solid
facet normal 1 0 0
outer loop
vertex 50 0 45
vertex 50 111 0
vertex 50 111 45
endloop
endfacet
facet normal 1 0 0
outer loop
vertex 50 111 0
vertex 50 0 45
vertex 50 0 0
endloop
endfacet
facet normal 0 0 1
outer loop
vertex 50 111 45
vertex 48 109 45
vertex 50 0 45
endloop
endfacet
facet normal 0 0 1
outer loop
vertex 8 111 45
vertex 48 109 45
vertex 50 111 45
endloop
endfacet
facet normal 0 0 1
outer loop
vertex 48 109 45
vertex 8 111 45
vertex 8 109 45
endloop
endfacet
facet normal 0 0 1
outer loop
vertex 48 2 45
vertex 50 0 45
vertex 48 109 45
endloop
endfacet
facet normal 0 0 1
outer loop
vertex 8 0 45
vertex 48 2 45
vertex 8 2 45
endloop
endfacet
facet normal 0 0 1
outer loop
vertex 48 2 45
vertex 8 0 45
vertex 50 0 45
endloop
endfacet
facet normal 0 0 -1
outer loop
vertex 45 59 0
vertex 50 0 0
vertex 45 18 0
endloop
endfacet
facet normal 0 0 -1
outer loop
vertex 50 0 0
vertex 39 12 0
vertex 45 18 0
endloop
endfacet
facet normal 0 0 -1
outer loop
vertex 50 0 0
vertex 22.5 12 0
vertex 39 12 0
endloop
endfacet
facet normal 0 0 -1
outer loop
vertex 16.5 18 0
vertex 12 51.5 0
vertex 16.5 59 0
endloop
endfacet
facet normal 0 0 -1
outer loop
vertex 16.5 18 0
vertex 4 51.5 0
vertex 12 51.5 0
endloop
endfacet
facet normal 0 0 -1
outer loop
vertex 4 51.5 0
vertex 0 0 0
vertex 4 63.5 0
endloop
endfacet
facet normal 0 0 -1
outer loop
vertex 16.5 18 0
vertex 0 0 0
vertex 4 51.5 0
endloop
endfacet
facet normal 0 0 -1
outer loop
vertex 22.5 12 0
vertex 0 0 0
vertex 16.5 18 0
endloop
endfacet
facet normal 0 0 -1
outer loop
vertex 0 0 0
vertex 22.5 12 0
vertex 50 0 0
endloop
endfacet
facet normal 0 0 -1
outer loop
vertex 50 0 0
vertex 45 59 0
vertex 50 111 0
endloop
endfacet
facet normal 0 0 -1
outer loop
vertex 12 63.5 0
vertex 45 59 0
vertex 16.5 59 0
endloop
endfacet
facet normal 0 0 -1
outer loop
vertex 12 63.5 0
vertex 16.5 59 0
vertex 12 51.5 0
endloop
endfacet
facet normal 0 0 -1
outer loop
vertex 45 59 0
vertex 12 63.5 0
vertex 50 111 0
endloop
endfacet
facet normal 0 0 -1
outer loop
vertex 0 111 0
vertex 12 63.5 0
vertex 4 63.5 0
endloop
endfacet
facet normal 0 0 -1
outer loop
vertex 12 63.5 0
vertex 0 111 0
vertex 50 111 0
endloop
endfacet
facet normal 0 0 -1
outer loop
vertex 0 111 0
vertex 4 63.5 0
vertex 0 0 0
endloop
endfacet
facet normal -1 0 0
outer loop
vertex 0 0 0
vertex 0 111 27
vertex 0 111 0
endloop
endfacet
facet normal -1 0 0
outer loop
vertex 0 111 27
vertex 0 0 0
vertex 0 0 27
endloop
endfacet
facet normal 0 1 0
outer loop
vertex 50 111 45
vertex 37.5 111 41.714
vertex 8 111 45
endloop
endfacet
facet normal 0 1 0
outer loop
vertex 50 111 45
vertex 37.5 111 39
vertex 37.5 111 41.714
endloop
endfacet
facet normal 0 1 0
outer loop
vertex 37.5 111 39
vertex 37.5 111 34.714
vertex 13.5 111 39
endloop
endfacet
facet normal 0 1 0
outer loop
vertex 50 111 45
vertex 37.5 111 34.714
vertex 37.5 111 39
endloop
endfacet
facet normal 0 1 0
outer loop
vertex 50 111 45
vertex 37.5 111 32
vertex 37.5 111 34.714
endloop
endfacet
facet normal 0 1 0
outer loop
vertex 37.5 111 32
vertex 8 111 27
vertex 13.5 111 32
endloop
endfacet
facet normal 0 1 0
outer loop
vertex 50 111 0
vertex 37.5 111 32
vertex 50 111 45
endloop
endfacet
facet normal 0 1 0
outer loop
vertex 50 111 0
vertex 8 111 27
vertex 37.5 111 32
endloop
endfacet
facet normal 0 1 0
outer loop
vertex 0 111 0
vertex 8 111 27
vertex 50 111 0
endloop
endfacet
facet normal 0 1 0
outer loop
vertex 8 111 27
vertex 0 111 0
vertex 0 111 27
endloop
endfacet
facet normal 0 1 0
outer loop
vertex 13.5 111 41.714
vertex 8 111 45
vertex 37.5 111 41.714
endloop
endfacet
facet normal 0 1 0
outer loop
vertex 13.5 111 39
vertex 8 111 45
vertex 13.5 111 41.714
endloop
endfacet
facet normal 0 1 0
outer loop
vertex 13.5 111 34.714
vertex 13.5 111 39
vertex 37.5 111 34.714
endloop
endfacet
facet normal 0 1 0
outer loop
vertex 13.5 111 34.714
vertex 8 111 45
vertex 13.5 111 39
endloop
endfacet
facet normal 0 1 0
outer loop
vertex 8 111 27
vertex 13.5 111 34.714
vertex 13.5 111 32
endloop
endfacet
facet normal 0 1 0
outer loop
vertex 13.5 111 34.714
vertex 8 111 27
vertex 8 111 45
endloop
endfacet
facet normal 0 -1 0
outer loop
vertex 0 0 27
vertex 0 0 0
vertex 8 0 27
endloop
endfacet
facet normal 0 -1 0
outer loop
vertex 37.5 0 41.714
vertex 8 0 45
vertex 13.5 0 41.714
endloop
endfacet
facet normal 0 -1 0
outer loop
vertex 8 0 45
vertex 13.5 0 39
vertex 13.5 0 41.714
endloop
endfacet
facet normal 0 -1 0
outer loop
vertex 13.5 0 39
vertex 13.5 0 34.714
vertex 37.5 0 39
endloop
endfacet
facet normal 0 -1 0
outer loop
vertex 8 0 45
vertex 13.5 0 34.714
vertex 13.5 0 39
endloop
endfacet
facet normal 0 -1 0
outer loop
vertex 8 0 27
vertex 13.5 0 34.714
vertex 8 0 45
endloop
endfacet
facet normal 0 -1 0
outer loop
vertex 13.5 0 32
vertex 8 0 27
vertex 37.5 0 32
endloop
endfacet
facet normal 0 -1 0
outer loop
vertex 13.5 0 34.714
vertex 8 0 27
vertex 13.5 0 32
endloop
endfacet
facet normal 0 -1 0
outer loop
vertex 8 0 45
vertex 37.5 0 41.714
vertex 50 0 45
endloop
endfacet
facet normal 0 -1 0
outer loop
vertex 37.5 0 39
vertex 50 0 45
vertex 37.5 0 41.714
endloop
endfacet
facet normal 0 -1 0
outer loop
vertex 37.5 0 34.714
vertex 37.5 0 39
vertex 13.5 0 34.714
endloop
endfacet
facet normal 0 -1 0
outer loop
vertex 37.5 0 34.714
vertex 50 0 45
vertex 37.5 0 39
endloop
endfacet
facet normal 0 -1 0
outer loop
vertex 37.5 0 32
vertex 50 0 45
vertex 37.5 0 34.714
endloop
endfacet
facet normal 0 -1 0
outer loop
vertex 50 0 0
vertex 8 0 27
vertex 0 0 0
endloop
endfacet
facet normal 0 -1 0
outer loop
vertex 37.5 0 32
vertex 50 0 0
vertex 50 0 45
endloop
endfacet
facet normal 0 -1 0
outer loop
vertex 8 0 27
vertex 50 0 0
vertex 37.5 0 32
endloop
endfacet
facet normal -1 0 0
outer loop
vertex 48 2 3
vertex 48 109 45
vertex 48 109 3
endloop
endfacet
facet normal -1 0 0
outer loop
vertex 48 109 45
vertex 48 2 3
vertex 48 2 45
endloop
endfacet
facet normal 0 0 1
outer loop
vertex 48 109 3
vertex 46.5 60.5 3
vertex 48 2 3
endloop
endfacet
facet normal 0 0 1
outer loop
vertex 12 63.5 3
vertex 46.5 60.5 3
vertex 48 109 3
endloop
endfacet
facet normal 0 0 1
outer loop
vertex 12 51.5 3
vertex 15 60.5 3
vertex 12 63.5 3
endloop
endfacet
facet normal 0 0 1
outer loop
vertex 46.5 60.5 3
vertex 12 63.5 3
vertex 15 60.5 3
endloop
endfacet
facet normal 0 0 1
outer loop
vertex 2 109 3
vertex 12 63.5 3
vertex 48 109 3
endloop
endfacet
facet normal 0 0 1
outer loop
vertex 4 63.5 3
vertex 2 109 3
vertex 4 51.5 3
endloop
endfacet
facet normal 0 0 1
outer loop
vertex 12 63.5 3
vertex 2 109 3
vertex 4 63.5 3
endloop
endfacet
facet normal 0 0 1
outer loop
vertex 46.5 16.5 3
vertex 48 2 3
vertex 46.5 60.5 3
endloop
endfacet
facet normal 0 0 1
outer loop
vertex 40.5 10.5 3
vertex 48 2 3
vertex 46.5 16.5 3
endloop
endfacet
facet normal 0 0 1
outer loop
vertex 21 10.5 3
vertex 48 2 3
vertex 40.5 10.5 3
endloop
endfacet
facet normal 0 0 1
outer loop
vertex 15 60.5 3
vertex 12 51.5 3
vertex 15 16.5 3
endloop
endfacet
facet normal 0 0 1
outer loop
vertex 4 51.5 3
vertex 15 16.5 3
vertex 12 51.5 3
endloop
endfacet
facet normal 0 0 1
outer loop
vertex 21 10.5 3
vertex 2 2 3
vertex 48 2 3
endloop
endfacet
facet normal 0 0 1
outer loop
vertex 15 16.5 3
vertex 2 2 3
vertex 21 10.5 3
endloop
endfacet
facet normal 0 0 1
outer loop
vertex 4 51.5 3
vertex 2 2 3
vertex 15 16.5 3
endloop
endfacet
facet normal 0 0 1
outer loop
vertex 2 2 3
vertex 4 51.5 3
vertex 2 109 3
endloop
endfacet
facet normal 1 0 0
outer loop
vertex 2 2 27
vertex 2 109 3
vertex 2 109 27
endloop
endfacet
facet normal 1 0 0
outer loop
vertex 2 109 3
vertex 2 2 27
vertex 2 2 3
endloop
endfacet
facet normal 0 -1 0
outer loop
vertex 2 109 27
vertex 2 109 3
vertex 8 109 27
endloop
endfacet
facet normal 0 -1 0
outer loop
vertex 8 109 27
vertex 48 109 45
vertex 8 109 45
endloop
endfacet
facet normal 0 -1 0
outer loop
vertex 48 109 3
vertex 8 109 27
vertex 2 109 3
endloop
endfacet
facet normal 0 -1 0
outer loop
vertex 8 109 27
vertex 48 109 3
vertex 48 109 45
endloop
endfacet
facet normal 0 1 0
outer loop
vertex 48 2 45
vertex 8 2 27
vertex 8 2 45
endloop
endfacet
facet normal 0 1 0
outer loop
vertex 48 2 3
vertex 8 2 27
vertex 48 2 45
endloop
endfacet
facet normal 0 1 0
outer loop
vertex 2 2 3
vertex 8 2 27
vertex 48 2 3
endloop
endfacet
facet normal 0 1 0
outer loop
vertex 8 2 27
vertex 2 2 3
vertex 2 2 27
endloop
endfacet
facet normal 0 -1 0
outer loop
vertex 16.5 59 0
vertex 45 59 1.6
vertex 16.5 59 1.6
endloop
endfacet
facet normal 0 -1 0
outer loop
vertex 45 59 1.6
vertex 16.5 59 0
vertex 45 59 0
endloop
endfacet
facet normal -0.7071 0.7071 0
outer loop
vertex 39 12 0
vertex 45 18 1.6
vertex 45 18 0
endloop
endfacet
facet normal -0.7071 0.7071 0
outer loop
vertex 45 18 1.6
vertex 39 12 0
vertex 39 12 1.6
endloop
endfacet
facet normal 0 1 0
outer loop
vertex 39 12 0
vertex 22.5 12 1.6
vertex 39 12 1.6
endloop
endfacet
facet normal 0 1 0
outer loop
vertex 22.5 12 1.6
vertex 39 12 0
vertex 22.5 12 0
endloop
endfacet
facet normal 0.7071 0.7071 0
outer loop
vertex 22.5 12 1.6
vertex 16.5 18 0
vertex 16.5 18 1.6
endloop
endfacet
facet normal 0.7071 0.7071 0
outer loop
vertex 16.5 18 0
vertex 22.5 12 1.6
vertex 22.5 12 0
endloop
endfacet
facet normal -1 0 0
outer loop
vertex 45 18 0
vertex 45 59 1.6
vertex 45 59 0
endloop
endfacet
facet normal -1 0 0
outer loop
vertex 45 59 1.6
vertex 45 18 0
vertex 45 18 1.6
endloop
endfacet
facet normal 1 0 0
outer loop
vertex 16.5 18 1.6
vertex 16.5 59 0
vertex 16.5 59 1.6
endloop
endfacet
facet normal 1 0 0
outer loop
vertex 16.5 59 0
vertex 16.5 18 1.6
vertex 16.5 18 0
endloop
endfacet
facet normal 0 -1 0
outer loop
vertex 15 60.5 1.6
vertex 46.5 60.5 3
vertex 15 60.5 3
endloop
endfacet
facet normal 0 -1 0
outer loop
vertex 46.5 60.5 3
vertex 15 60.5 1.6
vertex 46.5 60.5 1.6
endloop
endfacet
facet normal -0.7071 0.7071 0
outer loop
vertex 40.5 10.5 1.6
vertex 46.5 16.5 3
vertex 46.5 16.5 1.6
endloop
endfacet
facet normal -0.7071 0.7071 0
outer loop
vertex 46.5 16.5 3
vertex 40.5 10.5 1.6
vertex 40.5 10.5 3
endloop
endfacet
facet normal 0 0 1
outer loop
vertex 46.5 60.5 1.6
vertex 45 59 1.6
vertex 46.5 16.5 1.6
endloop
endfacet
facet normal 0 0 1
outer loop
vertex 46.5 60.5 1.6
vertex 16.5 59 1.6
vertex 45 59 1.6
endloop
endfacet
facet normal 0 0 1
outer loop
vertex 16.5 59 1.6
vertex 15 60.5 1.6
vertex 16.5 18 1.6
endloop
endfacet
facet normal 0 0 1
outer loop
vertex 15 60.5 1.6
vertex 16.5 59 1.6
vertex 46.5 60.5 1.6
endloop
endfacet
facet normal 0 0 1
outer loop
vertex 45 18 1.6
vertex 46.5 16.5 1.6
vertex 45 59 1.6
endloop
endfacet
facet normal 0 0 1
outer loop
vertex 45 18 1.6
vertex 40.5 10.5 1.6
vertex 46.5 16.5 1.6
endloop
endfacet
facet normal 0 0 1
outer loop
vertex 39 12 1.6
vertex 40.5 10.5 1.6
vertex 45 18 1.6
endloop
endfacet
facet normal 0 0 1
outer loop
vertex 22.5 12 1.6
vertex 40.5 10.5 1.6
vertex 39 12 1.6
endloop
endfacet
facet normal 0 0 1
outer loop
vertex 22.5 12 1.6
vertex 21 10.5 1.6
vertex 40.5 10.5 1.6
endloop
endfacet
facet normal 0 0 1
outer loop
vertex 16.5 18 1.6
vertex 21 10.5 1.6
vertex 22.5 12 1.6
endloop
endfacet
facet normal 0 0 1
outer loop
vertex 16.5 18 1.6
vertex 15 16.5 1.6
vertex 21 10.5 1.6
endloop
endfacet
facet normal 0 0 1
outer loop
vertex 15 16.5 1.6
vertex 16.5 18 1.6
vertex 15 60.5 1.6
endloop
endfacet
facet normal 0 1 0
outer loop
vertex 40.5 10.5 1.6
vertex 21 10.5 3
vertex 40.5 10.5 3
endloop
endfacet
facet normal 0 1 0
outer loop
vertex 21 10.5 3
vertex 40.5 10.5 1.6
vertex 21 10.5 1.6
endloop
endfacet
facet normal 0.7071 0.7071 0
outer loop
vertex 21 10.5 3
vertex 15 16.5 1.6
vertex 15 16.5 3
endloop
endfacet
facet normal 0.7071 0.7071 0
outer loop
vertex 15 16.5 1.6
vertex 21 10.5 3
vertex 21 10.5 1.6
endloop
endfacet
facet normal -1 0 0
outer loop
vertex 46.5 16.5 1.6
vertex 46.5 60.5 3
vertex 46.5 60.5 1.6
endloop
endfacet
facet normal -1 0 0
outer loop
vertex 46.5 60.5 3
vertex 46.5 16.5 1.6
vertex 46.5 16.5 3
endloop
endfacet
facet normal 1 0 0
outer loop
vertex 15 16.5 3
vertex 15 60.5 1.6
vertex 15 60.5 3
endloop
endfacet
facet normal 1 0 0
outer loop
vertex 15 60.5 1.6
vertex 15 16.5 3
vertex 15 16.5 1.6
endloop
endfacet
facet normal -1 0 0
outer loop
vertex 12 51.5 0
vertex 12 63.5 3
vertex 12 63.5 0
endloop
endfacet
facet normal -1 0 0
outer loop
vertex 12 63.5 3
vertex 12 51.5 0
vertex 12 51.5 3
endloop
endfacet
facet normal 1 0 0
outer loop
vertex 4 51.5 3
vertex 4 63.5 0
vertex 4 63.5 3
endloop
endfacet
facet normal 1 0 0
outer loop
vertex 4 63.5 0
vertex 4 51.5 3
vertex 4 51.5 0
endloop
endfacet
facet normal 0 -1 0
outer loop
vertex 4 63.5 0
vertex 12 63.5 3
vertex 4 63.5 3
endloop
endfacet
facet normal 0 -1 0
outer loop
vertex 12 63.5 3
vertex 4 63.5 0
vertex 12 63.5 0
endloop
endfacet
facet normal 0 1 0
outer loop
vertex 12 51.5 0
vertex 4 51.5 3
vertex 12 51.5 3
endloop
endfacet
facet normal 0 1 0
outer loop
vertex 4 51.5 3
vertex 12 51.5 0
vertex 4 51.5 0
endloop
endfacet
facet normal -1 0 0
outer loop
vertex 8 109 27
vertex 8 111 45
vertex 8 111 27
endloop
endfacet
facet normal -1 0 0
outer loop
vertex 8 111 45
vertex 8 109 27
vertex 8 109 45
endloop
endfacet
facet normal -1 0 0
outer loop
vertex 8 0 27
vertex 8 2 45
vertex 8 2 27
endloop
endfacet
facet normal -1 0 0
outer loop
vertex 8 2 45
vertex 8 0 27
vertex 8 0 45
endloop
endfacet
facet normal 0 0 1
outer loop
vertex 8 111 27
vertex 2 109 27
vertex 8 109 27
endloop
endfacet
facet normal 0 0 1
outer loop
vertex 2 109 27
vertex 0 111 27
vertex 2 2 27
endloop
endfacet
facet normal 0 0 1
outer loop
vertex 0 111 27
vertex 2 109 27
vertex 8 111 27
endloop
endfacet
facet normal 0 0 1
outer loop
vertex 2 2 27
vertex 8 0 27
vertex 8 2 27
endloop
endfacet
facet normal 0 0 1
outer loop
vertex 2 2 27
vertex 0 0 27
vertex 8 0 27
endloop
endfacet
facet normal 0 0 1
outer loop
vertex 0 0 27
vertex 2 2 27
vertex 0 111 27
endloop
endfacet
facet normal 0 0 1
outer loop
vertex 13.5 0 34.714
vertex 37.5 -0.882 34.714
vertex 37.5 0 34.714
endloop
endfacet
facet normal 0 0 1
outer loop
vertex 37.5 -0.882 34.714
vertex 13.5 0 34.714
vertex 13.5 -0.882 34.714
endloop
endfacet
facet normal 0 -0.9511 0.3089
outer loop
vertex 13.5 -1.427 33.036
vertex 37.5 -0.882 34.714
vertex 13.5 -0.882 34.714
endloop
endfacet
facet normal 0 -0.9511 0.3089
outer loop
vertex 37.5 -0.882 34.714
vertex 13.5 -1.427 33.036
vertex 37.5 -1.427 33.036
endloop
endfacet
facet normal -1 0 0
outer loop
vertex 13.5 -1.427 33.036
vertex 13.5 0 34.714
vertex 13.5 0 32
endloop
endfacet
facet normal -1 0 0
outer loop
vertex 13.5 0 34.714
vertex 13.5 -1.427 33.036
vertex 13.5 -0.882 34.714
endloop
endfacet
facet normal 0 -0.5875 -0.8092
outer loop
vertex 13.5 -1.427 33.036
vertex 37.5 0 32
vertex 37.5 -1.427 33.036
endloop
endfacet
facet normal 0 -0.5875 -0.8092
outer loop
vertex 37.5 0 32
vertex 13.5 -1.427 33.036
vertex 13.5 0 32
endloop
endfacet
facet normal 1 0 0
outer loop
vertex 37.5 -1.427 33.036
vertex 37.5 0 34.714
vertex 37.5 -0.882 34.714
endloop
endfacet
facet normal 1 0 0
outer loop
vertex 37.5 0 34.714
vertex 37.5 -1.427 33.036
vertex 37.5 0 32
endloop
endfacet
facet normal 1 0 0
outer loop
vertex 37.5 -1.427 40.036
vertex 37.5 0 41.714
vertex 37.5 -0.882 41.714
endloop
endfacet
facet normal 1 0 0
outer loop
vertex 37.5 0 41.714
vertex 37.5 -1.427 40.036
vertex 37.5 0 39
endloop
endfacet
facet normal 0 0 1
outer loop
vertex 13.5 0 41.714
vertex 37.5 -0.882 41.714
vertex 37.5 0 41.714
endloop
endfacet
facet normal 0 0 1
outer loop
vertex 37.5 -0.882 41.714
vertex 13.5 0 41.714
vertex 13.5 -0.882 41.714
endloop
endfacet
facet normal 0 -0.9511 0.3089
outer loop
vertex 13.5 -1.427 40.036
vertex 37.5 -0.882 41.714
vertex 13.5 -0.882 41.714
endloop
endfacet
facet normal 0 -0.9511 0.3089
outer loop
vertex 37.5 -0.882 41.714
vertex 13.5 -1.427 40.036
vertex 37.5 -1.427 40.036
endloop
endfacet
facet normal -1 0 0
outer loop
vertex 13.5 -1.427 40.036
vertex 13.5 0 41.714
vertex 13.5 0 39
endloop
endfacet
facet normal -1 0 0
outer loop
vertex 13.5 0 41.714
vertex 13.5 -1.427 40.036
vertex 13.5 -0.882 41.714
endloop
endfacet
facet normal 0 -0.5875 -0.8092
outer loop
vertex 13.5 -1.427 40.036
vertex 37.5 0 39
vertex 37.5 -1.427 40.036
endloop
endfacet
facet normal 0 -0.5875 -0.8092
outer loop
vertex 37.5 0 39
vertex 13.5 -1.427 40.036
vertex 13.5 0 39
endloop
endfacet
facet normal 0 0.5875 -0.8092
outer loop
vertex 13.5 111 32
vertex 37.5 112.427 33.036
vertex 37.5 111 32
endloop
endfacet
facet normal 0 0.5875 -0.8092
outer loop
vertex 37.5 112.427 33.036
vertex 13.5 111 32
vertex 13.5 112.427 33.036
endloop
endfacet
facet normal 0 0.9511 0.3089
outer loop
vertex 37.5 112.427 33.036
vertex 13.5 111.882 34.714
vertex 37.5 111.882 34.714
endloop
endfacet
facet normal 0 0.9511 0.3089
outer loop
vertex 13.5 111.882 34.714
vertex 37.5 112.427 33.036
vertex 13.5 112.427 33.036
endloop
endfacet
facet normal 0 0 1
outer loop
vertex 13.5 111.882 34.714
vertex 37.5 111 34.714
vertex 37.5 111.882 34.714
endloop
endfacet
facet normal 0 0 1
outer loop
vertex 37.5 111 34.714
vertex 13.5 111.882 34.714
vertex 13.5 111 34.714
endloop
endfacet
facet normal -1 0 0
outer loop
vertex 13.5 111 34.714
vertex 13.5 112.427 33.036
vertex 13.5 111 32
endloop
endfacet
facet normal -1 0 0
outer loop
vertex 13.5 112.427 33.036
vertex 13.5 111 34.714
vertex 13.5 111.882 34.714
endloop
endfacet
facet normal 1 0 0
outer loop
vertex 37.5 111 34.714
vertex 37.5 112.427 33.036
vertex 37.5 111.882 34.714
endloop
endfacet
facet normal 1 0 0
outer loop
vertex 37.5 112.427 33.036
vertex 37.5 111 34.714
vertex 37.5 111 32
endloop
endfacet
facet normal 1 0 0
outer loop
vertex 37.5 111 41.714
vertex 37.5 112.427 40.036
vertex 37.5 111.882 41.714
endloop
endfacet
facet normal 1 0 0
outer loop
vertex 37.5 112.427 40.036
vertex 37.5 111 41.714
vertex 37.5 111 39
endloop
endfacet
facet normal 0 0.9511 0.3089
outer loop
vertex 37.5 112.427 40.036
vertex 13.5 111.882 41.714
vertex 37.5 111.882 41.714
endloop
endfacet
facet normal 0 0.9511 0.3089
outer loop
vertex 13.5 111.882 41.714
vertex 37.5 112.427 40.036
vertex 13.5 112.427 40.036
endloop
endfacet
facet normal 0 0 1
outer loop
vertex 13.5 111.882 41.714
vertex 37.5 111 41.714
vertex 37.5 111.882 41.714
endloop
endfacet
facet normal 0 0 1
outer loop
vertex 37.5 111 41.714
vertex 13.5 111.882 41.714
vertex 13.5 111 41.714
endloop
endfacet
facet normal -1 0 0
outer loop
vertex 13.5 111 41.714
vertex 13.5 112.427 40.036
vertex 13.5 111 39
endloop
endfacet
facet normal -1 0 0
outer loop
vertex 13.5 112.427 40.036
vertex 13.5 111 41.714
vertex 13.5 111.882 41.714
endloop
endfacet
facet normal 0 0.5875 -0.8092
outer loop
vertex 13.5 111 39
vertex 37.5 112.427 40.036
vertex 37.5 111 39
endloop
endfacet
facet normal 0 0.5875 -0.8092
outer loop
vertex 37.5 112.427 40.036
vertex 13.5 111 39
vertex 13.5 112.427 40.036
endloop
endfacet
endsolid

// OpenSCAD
// Box size
boxwidth = 50;
boxlength = 111;
boxheight = 45;
boxwall = 2;
facewall = 3;

// Plug outlet hole

plugwidth= 28.5;
pluglength = 47;
plugheight = 6;
plugbevel = 6;

offsetx = boxwall+3;
offsety = 12;
offsetz = 1.6;
clearance = 1.5;

// Clip ridges

clipdiameter = 3;
clipspacing = 4;
clipfirst = 3;
cliptop = 12.5;
clipbottom = 36.5;

// Cable exit 
cutoutoffsetx = 18;
cutoutoffsety = 8;
cableoutwidth = 12;
cableoutheight = 8;
cableoffsety = 4;

module clip(height,diameter,spacing)
{
rotate ([0,90,0]) cylinder (r=diameter/2, h=height);
translate ([0,0,spacing]) rotate ([0,90,0]) cylinder (r=diameter/2, h=height);
}

module bevelbox(width,length,height,bevel)
{
linear_extrude (height = height) polygon([[0,bevel],[bevel,0],[length,0],[length,width],[bevel,width],[0,width-bevel]], convexity=1);

translate ([0,0,offsetz]) linear_extrude (height = height) polygon([[0-clearance,bevel-clearance],[bevel-clearance,0-clearance],[length+clearance,0-clearance],[length+clearance,width+clearance],[bevel-clearance,width+clearance],[0-clearance,width-bevel+clearance]], convexity=1);

}

module casing(w,l,h,t)
{
walls = t*2;
difference () {
	cube ([w,l,h]);
	translate ([t,t,facewall]) cube ([w-walls,l-walls,h]);
	}
}


module clearance(w,l,h,o)
{
translate ([0,0,o]) cube([w,l,h]);
}

difference () {
casing (boxwidth,boxlength,boxheight,boxwall);

union () {
translate ([boxwidth-offsetx,offsety,0]) rotate ([0,0,90]) bevelbox(plugwidth,pluglength,plugheight,plugbevel);
translate ([cableoffsety,boxlength/2-(cableoutheight/2),0]) cube([cableoutheight,cableoutwidth,boxwall+2]);
clearance (cutoutoffsety,boxlength,boxheight,boxheight-cutoutoffsetx);
}
}

translate ([boxwidth-clipbottom,0,clipdiameter/2+boxheight-clipfirst-(clipdiameter*2)-clipspacing]) clip (clipbottom-cliptop,clipdiameter,clipspacing+clipdiameter);

translate ([boxwidth-clipbottom,boxlength,clipdiameter/2+boxheight-clipfirst-(clipdiameter*2)-clipspacing]) clip (clipbottom-cliptop,clipdiameter,clipspacing+clipdiameter);
